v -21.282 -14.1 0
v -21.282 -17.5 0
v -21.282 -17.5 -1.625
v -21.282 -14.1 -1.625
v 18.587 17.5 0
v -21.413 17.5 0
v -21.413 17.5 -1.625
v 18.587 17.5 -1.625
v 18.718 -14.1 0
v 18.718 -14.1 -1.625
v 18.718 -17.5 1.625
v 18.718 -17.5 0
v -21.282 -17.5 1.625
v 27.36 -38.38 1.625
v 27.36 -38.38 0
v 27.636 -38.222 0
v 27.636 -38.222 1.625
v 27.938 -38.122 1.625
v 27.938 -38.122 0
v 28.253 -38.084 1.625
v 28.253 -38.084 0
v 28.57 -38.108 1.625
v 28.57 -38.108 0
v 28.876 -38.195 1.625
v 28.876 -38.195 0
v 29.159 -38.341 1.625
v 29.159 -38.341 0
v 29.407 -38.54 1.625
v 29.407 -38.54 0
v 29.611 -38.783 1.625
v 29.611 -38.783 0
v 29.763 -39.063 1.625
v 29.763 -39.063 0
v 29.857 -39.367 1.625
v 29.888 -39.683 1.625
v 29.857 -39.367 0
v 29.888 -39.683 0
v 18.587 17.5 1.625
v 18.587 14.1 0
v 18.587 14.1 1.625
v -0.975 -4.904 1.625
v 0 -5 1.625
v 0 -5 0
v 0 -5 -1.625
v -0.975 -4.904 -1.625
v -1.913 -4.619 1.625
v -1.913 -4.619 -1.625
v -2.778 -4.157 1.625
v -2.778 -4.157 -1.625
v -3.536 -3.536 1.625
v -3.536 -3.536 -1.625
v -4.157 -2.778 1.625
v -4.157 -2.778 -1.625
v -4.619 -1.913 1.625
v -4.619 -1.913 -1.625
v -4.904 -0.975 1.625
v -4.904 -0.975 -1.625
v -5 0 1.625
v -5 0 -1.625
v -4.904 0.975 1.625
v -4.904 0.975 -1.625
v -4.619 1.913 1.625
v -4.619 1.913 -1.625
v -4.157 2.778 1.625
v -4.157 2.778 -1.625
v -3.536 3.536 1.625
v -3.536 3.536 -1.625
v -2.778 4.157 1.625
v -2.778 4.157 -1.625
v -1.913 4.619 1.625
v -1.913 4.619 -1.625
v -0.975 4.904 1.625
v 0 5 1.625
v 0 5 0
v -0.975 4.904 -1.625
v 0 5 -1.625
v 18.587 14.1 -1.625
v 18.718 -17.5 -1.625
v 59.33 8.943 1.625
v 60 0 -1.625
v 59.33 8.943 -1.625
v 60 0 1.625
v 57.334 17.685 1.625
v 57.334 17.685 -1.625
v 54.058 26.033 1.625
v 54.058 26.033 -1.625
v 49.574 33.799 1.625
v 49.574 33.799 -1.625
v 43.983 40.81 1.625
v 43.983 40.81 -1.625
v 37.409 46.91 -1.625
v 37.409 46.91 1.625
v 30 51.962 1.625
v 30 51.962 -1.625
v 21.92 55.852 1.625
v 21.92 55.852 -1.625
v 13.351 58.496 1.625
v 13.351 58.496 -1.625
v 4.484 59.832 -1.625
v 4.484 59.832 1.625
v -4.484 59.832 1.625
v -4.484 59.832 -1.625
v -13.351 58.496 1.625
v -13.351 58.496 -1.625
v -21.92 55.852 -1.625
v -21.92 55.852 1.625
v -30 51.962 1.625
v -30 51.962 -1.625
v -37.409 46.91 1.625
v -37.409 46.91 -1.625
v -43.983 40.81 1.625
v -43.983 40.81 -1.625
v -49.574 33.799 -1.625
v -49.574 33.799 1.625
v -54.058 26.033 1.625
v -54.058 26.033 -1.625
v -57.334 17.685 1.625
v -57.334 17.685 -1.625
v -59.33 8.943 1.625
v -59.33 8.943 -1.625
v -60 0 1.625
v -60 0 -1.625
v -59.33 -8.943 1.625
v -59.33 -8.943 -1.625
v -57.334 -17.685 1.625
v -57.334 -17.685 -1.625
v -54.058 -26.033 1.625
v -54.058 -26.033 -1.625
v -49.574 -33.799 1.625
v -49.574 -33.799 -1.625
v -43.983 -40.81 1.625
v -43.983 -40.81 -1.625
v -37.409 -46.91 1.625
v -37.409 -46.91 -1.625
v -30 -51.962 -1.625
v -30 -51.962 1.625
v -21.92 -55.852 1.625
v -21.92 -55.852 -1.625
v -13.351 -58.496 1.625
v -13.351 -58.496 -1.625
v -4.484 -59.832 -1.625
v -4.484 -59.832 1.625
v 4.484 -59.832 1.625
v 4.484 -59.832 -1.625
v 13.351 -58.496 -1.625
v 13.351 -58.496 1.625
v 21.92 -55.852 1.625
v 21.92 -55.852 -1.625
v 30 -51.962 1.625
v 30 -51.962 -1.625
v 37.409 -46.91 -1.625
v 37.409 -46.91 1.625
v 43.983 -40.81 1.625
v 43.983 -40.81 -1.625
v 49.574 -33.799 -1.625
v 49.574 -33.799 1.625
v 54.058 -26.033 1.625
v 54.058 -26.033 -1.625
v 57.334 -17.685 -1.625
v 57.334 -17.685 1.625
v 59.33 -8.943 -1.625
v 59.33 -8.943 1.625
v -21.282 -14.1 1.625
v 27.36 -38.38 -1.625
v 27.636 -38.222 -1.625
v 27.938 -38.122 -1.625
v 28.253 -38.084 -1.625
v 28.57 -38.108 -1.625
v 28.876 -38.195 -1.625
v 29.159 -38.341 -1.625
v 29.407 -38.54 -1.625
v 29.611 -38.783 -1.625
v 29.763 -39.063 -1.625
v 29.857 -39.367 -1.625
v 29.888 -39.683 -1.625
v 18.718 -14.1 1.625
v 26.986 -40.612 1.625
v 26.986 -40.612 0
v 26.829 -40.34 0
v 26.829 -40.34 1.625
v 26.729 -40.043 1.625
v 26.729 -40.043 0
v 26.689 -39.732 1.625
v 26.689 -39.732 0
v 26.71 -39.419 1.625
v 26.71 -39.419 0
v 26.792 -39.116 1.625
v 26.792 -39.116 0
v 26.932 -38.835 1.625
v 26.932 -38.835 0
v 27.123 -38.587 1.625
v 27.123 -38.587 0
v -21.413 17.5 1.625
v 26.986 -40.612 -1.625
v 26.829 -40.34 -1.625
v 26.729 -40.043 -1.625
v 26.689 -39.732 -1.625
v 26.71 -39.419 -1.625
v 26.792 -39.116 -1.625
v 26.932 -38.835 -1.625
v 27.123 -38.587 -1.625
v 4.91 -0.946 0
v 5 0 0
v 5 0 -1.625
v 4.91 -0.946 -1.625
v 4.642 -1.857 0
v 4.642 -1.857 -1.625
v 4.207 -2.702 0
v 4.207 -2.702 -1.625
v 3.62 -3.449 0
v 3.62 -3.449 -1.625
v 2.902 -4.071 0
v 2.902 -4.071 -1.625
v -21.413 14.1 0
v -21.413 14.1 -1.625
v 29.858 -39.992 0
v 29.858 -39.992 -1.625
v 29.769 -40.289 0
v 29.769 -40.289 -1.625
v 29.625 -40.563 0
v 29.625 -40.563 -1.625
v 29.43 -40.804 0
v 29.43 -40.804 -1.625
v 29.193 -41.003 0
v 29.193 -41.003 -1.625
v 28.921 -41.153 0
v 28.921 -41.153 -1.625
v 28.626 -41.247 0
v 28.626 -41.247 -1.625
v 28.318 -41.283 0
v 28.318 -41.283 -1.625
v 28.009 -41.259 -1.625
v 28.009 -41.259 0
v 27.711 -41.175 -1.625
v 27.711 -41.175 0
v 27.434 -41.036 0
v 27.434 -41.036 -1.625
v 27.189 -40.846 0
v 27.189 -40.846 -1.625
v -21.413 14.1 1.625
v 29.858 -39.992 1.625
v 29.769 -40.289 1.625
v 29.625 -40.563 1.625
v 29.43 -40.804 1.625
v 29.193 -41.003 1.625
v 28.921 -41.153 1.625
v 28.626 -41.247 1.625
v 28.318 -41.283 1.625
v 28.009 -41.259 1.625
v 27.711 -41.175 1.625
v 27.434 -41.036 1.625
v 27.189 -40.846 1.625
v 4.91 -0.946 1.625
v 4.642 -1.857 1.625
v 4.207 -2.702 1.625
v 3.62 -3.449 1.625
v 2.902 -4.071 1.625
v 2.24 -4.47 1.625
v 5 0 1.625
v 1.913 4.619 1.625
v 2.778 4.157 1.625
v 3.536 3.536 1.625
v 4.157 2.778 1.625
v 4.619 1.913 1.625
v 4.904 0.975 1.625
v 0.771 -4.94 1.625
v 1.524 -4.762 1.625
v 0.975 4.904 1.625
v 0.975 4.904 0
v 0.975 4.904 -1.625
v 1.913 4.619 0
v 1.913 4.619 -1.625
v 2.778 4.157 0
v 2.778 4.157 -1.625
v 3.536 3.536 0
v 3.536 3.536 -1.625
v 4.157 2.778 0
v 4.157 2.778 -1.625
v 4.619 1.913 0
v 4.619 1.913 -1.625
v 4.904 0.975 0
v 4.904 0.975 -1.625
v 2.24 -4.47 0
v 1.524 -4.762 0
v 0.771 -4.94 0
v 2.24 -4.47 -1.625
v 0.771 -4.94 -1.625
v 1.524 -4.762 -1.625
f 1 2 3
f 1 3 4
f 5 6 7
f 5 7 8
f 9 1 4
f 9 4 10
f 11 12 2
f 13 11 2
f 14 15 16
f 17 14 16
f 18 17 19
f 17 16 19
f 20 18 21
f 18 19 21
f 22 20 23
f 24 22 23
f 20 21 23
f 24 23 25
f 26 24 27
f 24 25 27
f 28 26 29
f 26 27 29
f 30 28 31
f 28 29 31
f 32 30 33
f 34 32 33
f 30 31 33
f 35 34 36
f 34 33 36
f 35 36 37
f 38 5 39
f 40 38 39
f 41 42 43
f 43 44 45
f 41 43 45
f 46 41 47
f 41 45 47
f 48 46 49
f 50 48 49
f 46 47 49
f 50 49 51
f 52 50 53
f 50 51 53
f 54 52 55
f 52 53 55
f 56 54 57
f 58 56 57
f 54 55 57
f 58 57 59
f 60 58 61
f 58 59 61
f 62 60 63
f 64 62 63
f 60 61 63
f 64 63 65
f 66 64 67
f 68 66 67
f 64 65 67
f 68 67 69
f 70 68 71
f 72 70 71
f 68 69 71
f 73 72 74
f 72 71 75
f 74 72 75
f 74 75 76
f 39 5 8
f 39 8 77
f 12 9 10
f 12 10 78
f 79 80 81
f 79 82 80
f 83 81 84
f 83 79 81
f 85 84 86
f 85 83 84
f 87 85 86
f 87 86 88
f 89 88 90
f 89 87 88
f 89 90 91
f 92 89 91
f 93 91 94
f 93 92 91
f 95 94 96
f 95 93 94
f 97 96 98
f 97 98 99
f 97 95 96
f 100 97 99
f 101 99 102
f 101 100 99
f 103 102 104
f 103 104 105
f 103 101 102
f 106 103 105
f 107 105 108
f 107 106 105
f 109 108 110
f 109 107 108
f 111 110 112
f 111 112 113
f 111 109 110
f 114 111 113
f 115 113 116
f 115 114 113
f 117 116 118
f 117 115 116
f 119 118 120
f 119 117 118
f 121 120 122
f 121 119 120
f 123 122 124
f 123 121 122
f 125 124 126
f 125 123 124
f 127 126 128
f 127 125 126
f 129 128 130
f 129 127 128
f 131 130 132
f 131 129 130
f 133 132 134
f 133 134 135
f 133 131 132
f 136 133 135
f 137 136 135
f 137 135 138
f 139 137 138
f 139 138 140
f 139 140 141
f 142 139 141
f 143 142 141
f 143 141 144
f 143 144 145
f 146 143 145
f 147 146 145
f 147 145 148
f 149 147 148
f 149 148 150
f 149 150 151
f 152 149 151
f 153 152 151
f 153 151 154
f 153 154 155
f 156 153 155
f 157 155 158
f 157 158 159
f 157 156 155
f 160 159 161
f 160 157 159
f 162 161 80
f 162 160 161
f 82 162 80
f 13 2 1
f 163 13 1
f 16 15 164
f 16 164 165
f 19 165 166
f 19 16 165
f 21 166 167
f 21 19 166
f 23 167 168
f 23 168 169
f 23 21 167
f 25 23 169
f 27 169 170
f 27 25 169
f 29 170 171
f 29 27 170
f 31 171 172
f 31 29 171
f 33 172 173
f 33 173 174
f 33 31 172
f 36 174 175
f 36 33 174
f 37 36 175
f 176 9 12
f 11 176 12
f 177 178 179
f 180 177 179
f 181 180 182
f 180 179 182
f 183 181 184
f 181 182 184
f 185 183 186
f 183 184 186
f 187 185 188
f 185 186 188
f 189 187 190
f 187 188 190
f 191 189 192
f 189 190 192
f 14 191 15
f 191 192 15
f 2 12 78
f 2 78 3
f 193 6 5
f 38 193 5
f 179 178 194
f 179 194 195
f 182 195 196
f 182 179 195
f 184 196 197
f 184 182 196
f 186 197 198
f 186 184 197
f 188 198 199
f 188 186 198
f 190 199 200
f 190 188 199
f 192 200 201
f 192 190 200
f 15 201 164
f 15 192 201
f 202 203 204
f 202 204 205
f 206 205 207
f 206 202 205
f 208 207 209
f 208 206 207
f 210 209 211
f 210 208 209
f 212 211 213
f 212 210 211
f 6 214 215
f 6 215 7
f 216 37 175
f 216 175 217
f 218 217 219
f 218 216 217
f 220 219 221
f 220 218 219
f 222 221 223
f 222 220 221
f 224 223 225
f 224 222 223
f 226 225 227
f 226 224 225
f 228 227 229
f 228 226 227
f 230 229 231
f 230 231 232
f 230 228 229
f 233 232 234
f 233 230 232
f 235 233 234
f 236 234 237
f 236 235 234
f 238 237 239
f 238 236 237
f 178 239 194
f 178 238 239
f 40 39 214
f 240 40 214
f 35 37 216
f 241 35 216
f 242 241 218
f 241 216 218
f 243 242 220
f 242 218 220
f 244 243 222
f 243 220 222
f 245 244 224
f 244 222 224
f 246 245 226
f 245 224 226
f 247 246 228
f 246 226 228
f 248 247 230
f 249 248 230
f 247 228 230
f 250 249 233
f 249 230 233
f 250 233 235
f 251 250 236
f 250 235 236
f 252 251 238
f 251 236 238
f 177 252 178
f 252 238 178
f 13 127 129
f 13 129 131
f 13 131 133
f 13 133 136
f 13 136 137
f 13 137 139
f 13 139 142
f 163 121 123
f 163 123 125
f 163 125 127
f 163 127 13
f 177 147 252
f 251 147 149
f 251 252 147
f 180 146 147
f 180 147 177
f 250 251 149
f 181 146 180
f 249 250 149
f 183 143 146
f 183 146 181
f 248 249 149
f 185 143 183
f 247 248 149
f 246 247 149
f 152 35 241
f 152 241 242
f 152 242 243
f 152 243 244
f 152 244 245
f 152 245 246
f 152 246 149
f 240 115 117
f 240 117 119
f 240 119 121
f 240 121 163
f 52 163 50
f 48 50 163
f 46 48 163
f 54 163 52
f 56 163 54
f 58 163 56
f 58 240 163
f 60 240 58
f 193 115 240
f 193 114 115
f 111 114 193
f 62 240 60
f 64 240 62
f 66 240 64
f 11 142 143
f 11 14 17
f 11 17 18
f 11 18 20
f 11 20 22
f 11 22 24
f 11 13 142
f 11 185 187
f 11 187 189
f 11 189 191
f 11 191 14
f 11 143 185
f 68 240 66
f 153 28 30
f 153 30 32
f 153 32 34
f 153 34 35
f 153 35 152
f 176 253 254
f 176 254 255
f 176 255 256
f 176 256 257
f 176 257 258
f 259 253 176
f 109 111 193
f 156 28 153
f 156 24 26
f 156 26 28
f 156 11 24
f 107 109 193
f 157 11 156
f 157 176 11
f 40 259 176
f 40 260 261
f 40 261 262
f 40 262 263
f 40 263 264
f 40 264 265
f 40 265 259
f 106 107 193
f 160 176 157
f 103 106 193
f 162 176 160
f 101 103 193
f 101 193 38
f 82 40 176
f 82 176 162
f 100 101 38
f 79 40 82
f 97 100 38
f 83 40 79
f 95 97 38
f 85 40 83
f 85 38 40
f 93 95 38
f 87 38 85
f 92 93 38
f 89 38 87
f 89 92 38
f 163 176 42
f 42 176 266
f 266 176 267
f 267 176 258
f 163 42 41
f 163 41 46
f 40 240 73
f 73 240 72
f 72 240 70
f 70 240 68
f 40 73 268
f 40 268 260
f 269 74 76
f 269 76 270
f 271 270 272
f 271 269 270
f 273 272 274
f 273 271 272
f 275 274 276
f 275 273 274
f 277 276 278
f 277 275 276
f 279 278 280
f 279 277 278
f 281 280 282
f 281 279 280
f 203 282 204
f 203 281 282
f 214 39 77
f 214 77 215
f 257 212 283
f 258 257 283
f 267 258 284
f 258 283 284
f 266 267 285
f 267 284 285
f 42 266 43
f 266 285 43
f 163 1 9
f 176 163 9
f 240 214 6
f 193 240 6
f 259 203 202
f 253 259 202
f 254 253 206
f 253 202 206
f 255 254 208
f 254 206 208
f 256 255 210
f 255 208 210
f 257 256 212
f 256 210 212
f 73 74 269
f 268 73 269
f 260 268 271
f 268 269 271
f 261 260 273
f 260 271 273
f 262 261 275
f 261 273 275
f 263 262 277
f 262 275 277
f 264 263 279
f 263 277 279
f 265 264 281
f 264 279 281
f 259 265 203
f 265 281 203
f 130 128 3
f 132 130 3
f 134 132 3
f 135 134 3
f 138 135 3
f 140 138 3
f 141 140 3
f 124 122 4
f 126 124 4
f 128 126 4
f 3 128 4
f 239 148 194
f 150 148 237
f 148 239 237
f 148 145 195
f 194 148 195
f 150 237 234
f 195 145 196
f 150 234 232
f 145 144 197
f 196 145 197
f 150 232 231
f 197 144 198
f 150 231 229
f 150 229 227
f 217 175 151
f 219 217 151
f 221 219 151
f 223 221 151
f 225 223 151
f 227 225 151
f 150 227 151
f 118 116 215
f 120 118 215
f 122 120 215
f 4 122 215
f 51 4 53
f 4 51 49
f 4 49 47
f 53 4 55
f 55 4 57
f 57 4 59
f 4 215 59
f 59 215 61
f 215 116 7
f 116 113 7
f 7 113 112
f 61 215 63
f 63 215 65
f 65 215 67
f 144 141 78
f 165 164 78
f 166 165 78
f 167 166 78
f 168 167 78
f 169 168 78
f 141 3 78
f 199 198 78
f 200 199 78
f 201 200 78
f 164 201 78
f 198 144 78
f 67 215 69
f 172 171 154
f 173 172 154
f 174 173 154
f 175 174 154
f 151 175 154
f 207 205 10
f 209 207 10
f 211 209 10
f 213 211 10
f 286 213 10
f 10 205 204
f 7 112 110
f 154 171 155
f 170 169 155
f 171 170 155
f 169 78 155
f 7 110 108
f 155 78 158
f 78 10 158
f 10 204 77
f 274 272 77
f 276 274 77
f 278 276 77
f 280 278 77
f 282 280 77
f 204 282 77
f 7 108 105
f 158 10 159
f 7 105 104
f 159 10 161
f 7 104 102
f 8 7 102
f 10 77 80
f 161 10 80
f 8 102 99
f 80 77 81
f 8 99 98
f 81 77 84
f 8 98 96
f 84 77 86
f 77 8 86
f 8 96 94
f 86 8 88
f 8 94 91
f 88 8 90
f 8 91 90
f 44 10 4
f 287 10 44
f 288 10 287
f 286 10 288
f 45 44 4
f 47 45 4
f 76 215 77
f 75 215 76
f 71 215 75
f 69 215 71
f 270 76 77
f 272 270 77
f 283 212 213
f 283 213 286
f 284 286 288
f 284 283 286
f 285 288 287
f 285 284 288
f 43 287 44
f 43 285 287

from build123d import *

# Parameters (mm, degrees)
F1_DEPTH = 1.625


# Not quite as in the source:
# - a feature names something its author has since deleted; it is built from what else it names


with BuildPart() as f1:
    # F0 (on Top) → F1 (new body, symmetric)
    with BuildSketch(Plane.XY):
        with BuildLine():
            ThreePointArc((-0.2115118035, -59.9996271885), (42.3515601353, -42.5011217982), (60, 0))
            ThreePointArc((60, 0), (-42.3515601353, 42.5011217982), (-0.2115118035, -59.9996271885))
        make_face()
        with BuildLine():
            ThreePointArc((29.8884344963, -39.6833022032), (28.7759960304, -41.2072063178), (26.9855798083, -40.6120484882))
            ThreePointArc((26.9855798083, -40.6120484882), (26.7104543153, -39.4187676146), (27.3596882112, -38.3804475152))
            ThreePointArc((27.3596882112, -38.3804475152), (29.0212393625, -38.2609812028), (29.8884344963, -39.6833022032))
        make_face(mode=Mode.SUBTRACT)
        with BuildLine():
            Line((18.7182445079, -17.5), (12.4749599, -17.5))
            Line((12.4749599, -17.5), (0, -17.5))
            Line((0, -17.5), (-21.2817554921, -17.5))
            Line((-21.2817554921, -17.5), (-21.2817554921, -14.1))
            Line((-21.2817554921, -14.1), (-11.0323727131, -14.1))
            Line((-11.0323727131, -14.1), (-11.0323727131, 14.1))
            Line((-11.0323727131, 14.1), (-21.4130617678, 14.1))
            Line((-21.4130617678, 14.1), (-21.4130617678, 17.5))
            Line((-21.4130617678, 17.5), (0, 17.5))
            Line((0, 17.5), (18.5869382322, 17.5))
            Line((18.5869382322, 17.5), (18.5869382322, 14.1))
            Line((18.5869382322, 14.1), (0, 14.1))
            Line((0, 14.1), (0, 5))
            ThreePointArc((0, 5), (3.5355339059, 3.5355339059), (5, 0))
            ThreePointArc((5, 0), (4.4447531261, -2.290015207), (2.9023321408, -4.0714209))
            Line((2.9023321408, -4.0714209), (10.0512534051, -14.1))
            Line((10.0512534051, -14.1), (18.7182445079, -14.1))
            Line((18.7182445079, -14.1), (18.7182445079, -17.5))
        make_face(mode=Mode.SUBTRACT)
        with BuildLine():
            Line((0, -14.1), (10.0512534051, -14.1))
            Line((10.0512534051, -14.1), (2.9023321408, -4.0714209))
            ThreePointArc((2.9023321408, -4.0714209), (1.5236297943, -4.762200358), (0, -5))
            Line((0, -5), (0, -14.1))
        make_face()
        with BuildLine():
            Line((-11.0323727131, -14.1), (0, -14.1))
            Line((0, -14.1), (0, -5))
            ThreePointArc((0, -5), (-5, 0), (0, 5))
            Line((0, 5), (0, 14.1))
            Line((0, 14.1), (-11.0323727131, 14.1))
            Line((-11.0323727131, 14.1), (-11.0323727131, -14.1))
        make_face()
    extrude(amount=F1_DEPTH, both=True)


solid = f1.part
